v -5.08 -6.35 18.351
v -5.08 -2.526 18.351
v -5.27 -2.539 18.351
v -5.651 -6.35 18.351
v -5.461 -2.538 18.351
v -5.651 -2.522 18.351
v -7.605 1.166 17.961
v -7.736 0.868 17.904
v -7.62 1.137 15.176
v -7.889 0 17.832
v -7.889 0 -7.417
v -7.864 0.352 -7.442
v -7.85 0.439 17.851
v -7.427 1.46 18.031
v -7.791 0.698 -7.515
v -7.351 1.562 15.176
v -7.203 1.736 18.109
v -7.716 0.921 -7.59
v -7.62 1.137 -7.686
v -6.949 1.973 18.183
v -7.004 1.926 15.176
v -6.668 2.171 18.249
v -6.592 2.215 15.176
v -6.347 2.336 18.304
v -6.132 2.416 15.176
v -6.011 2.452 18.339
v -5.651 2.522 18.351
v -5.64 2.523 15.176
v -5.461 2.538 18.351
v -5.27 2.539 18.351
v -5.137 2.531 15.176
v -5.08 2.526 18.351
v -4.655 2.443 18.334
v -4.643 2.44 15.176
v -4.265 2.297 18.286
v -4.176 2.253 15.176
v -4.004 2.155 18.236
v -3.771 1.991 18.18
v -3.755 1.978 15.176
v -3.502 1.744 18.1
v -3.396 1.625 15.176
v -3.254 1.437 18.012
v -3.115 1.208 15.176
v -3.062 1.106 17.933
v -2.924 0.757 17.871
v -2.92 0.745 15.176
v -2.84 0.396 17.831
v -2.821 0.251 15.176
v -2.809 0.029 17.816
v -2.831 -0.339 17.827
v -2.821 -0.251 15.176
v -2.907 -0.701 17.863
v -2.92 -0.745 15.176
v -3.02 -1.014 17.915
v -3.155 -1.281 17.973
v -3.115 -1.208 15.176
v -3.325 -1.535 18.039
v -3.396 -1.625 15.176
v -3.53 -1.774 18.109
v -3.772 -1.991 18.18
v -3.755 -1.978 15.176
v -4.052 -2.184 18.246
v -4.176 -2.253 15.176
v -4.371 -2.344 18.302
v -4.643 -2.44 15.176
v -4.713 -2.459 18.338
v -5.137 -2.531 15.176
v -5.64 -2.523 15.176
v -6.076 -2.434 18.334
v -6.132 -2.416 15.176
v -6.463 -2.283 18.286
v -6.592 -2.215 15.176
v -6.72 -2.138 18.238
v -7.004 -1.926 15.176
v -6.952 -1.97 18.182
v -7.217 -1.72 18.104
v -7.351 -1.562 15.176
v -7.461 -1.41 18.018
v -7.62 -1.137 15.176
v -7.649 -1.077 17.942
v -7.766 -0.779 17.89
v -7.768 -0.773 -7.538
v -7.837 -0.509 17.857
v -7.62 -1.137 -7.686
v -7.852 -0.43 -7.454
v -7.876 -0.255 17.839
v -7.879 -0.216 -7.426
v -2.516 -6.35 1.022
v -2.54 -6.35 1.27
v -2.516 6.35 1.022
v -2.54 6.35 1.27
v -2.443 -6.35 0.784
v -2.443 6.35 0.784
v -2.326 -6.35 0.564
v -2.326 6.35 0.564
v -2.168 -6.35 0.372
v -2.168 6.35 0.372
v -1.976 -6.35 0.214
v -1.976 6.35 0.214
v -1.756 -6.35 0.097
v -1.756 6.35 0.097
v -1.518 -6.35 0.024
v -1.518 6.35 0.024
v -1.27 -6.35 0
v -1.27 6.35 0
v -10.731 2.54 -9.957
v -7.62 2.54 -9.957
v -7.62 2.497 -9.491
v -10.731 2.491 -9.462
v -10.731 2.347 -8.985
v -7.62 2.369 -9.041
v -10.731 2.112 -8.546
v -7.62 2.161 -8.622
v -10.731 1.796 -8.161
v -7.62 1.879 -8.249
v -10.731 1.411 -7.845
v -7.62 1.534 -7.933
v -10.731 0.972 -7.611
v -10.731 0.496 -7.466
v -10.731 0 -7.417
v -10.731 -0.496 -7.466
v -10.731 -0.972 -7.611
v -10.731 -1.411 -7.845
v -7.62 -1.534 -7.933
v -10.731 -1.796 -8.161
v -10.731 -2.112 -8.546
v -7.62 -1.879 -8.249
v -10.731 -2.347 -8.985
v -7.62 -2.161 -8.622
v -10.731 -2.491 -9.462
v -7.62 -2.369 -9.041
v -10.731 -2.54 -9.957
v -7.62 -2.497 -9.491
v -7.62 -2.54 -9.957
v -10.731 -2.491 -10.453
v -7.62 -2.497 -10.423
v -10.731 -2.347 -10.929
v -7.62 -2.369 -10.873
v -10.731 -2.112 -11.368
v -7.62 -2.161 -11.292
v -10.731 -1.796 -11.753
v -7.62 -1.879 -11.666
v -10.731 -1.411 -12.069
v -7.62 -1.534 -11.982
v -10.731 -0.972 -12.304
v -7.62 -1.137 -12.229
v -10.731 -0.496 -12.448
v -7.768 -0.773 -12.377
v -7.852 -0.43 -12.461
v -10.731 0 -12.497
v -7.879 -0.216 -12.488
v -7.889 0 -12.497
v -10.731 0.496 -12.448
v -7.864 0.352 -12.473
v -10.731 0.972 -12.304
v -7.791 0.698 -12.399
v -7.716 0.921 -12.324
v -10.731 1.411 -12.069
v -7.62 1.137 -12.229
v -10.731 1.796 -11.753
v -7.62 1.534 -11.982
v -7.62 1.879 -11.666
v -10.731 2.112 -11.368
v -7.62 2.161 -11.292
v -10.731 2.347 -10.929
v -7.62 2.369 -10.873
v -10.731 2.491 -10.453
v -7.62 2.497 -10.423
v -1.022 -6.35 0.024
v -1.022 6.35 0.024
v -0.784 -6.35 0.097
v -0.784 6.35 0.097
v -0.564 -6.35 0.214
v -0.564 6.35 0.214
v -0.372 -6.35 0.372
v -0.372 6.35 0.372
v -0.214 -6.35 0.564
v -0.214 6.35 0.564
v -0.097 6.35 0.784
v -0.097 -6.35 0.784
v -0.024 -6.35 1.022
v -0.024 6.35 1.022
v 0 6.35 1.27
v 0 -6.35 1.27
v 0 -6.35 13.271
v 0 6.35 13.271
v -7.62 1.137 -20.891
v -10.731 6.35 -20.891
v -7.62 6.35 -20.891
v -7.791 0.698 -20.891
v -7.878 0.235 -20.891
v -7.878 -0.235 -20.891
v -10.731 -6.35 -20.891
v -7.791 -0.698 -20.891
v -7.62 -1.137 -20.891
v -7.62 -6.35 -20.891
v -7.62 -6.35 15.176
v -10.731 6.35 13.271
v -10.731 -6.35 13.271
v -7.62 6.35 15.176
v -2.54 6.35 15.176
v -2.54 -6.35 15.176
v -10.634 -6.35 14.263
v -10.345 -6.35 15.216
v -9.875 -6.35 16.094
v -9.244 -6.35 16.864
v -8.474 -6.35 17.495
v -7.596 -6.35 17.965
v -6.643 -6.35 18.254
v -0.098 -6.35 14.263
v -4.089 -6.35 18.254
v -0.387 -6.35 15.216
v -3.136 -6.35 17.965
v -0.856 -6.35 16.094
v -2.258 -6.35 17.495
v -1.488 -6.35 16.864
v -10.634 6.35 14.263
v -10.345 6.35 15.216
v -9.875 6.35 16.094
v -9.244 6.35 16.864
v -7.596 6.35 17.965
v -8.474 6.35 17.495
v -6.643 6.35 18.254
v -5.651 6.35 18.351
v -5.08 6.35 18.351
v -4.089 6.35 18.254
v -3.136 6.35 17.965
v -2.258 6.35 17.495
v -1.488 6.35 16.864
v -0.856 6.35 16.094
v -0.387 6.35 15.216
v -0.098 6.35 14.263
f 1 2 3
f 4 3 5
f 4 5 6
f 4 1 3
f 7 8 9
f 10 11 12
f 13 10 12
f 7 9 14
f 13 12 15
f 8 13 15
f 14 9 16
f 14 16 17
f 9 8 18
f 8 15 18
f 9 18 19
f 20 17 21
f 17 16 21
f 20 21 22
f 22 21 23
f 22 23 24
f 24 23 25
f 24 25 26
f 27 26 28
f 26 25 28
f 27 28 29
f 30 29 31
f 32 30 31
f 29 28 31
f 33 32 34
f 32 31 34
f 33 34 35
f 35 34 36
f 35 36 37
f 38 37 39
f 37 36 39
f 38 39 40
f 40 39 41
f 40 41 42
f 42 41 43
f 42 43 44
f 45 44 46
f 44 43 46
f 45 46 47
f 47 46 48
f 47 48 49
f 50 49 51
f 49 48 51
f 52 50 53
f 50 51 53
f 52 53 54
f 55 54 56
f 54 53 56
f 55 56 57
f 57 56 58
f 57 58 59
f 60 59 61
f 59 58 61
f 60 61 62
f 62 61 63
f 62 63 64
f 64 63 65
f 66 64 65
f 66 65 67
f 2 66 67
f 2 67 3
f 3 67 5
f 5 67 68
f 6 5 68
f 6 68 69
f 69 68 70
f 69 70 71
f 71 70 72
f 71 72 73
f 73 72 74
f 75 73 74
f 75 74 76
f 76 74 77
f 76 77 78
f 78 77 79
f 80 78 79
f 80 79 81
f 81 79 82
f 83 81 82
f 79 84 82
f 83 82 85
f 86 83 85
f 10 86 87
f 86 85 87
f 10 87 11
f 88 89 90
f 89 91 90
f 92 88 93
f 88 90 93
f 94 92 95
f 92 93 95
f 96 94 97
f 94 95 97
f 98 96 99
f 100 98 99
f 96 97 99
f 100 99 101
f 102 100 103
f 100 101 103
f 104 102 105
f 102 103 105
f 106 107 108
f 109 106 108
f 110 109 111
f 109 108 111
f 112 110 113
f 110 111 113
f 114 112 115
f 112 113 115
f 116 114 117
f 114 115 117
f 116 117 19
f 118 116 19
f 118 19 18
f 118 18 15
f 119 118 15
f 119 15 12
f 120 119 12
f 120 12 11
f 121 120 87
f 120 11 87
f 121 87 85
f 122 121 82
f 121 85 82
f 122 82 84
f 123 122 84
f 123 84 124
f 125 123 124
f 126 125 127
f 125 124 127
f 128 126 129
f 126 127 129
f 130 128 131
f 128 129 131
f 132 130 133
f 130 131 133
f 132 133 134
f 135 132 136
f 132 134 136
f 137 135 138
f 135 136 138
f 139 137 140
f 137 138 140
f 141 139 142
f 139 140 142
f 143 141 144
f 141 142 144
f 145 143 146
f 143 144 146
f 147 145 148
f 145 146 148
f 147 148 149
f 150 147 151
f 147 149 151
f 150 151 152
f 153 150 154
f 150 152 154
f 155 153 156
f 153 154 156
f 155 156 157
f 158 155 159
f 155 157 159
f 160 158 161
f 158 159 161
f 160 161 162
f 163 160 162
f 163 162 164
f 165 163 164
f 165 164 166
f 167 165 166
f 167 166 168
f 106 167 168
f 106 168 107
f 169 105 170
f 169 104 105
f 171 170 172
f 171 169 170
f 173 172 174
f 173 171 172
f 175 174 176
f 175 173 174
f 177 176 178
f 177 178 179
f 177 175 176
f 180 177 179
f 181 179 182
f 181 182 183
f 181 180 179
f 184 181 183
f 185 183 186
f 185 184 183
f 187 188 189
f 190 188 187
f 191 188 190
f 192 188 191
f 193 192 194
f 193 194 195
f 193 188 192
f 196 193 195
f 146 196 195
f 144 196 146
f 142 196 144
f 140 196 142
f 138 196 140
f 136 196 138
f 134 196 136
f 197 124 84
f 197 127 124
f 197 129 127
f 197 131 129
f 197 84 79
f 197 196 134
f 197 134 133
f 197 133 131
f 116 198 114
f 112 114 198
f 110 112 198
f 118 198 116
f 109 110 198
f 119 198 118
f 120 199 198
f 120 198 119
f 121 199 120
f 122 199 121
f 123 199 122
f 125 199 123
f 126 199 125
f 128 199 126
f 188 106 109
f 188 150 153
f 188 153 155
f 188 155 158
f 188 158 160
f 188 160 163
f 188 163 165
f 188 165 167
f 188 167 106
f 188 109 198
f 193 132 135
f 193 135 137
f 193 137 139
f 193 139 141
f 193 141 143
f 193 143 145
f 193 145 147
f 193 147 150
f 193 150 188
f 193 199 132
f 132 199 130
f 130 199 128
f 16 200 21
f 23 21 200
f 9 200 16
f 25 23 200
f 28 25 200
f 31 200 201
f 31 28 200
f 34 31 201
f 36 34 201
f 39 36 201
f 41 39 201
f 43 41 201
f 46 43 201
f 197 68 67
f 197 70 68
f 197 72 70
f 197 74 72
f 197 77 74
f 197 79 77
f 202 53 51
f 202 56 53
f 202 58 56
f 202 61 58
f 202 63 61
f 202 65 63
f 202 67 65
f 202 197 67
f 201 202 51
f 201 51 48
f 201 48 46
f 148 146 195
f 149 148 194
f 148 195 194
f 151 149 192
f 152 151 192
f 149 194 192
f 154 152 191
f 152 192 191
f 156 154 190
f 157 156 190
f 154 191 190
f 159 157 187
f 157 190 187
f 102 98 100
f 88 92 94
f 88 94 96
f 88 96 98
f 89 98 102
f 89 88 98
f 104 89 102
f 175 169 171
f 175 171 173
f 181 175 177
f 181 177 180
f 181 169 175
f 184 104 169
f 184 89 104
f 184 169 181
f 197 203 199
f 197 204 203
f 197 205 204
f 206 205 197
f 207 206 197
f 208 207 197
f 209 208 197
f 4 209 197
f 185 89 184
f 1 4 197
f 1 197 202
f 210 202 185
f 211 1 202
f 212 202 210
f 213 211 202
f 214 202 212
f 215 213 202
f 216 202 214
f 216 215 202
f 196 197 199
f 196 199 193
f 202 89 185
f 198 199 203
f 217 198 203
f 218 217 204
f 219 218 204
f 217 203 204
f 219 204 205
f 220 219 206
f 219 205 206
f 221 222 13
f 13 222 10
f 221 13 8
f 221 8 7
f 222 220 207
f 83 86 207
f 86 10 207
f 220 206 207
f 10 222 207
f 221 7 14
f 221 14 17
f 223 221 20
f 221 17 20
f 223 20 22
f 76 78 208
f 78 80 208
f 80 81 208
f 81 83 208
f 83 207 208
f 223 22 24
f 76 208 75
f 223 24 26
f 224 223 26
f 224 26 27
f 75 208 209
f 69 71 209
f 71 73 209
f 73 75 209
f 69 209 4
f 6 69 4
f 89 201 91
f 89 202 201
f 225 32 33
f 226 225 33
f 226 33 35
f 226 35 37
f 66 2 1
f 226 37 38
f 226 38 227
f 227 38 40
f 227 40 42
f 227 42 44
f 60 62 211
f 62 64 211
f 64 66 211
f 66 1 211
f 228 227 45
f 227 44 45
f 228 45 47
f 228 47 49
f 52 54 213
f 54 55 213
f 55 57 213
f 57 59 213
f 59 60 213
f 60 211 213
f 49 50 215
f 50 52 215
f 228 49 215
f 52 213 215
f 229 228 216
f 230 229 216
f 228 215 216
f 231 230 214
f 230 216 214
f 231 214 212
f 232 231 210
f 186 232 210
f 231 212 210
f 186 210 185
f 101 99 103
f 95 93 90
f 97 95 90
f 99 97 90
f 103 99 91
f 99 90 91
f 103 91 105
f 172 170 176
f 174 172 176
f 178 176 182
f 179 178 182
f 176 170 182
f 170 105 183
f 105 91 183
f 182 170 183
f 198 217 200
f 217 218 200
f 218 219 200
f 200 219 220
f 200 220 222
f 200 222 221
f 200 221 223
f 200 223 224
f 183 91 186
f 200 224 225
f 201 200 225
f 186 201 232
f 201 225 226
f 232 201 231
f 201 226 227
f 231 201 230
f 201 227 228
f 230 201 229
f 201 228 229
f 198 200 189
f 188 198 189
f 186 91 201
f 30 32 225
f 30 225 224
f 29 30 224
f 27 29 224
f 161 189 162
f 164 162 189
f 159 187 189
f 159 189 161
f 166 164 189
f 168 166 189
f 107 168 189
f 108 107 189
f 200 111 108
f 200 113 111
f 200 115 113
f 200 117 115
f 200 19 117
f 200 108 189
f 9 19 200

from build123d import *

# Parameters (mm, degrees)
F1_DEPTH = 6.35
F2_R     = 5.08
F5_D     = 5.08
F6_D     = 5.08
F7_R     = 1.26999


# Not quite as in the source:
# - a fillet or chamfer is up to 0.001 mm smaller than in the source, because OpenCascade refuses the exact size


with BuildPart() as f1:
    # F0 (on Front) → F1 (new body, symmetric)
    with BuildSketch(Plane.XZ):
        Polygon((-2.54, 0), (0, 0), (0, 18.3514992646), (-10.7314998529, 18.3514992646), (-10.7314998529, -20.8914992646), (-7.62, -20.8914992646), (-7.62, 15.176498382), (-2.54, 15.176498382), align=None)
    extrude(amount=F1_DEPTH, both=True)

    # F2
    f2_edges = [f1.edges().sort_by_distance(p)[0] for p in [
        (0, 0, 18.351499),
        (-10.7315, 0, 18.351499),
    ]]
    fillet(f2_edges, radius=F2_R)

    # F5 (through all)
    with Locations(Plane.XY.offset(18.3514992646)):
        with Locations((-5.3486400284, 0)):
            Hole(F5_D / 2)

    # F6 (through all)
    with Locations(Plane(origin=(-10.7314998529, 0, 0), x_dir=(0, -1, 0), z_dir=(-1, 0, 0))):
        with Locations((0, -9.9572697654)):
            Hole(F6_D / 2)

    # F7 (radius 1.27 in the source; OpenCascade refuses exactly that, so slightly less here)
    f7_edges = [f1.edges().sort_by_distance(p)[0] for p in [
        (0, 0, 0),
        (-2.54, 0, 0),
    ]]
    fillet(f7_edges, radius=F7_R)


solid = f1.part
